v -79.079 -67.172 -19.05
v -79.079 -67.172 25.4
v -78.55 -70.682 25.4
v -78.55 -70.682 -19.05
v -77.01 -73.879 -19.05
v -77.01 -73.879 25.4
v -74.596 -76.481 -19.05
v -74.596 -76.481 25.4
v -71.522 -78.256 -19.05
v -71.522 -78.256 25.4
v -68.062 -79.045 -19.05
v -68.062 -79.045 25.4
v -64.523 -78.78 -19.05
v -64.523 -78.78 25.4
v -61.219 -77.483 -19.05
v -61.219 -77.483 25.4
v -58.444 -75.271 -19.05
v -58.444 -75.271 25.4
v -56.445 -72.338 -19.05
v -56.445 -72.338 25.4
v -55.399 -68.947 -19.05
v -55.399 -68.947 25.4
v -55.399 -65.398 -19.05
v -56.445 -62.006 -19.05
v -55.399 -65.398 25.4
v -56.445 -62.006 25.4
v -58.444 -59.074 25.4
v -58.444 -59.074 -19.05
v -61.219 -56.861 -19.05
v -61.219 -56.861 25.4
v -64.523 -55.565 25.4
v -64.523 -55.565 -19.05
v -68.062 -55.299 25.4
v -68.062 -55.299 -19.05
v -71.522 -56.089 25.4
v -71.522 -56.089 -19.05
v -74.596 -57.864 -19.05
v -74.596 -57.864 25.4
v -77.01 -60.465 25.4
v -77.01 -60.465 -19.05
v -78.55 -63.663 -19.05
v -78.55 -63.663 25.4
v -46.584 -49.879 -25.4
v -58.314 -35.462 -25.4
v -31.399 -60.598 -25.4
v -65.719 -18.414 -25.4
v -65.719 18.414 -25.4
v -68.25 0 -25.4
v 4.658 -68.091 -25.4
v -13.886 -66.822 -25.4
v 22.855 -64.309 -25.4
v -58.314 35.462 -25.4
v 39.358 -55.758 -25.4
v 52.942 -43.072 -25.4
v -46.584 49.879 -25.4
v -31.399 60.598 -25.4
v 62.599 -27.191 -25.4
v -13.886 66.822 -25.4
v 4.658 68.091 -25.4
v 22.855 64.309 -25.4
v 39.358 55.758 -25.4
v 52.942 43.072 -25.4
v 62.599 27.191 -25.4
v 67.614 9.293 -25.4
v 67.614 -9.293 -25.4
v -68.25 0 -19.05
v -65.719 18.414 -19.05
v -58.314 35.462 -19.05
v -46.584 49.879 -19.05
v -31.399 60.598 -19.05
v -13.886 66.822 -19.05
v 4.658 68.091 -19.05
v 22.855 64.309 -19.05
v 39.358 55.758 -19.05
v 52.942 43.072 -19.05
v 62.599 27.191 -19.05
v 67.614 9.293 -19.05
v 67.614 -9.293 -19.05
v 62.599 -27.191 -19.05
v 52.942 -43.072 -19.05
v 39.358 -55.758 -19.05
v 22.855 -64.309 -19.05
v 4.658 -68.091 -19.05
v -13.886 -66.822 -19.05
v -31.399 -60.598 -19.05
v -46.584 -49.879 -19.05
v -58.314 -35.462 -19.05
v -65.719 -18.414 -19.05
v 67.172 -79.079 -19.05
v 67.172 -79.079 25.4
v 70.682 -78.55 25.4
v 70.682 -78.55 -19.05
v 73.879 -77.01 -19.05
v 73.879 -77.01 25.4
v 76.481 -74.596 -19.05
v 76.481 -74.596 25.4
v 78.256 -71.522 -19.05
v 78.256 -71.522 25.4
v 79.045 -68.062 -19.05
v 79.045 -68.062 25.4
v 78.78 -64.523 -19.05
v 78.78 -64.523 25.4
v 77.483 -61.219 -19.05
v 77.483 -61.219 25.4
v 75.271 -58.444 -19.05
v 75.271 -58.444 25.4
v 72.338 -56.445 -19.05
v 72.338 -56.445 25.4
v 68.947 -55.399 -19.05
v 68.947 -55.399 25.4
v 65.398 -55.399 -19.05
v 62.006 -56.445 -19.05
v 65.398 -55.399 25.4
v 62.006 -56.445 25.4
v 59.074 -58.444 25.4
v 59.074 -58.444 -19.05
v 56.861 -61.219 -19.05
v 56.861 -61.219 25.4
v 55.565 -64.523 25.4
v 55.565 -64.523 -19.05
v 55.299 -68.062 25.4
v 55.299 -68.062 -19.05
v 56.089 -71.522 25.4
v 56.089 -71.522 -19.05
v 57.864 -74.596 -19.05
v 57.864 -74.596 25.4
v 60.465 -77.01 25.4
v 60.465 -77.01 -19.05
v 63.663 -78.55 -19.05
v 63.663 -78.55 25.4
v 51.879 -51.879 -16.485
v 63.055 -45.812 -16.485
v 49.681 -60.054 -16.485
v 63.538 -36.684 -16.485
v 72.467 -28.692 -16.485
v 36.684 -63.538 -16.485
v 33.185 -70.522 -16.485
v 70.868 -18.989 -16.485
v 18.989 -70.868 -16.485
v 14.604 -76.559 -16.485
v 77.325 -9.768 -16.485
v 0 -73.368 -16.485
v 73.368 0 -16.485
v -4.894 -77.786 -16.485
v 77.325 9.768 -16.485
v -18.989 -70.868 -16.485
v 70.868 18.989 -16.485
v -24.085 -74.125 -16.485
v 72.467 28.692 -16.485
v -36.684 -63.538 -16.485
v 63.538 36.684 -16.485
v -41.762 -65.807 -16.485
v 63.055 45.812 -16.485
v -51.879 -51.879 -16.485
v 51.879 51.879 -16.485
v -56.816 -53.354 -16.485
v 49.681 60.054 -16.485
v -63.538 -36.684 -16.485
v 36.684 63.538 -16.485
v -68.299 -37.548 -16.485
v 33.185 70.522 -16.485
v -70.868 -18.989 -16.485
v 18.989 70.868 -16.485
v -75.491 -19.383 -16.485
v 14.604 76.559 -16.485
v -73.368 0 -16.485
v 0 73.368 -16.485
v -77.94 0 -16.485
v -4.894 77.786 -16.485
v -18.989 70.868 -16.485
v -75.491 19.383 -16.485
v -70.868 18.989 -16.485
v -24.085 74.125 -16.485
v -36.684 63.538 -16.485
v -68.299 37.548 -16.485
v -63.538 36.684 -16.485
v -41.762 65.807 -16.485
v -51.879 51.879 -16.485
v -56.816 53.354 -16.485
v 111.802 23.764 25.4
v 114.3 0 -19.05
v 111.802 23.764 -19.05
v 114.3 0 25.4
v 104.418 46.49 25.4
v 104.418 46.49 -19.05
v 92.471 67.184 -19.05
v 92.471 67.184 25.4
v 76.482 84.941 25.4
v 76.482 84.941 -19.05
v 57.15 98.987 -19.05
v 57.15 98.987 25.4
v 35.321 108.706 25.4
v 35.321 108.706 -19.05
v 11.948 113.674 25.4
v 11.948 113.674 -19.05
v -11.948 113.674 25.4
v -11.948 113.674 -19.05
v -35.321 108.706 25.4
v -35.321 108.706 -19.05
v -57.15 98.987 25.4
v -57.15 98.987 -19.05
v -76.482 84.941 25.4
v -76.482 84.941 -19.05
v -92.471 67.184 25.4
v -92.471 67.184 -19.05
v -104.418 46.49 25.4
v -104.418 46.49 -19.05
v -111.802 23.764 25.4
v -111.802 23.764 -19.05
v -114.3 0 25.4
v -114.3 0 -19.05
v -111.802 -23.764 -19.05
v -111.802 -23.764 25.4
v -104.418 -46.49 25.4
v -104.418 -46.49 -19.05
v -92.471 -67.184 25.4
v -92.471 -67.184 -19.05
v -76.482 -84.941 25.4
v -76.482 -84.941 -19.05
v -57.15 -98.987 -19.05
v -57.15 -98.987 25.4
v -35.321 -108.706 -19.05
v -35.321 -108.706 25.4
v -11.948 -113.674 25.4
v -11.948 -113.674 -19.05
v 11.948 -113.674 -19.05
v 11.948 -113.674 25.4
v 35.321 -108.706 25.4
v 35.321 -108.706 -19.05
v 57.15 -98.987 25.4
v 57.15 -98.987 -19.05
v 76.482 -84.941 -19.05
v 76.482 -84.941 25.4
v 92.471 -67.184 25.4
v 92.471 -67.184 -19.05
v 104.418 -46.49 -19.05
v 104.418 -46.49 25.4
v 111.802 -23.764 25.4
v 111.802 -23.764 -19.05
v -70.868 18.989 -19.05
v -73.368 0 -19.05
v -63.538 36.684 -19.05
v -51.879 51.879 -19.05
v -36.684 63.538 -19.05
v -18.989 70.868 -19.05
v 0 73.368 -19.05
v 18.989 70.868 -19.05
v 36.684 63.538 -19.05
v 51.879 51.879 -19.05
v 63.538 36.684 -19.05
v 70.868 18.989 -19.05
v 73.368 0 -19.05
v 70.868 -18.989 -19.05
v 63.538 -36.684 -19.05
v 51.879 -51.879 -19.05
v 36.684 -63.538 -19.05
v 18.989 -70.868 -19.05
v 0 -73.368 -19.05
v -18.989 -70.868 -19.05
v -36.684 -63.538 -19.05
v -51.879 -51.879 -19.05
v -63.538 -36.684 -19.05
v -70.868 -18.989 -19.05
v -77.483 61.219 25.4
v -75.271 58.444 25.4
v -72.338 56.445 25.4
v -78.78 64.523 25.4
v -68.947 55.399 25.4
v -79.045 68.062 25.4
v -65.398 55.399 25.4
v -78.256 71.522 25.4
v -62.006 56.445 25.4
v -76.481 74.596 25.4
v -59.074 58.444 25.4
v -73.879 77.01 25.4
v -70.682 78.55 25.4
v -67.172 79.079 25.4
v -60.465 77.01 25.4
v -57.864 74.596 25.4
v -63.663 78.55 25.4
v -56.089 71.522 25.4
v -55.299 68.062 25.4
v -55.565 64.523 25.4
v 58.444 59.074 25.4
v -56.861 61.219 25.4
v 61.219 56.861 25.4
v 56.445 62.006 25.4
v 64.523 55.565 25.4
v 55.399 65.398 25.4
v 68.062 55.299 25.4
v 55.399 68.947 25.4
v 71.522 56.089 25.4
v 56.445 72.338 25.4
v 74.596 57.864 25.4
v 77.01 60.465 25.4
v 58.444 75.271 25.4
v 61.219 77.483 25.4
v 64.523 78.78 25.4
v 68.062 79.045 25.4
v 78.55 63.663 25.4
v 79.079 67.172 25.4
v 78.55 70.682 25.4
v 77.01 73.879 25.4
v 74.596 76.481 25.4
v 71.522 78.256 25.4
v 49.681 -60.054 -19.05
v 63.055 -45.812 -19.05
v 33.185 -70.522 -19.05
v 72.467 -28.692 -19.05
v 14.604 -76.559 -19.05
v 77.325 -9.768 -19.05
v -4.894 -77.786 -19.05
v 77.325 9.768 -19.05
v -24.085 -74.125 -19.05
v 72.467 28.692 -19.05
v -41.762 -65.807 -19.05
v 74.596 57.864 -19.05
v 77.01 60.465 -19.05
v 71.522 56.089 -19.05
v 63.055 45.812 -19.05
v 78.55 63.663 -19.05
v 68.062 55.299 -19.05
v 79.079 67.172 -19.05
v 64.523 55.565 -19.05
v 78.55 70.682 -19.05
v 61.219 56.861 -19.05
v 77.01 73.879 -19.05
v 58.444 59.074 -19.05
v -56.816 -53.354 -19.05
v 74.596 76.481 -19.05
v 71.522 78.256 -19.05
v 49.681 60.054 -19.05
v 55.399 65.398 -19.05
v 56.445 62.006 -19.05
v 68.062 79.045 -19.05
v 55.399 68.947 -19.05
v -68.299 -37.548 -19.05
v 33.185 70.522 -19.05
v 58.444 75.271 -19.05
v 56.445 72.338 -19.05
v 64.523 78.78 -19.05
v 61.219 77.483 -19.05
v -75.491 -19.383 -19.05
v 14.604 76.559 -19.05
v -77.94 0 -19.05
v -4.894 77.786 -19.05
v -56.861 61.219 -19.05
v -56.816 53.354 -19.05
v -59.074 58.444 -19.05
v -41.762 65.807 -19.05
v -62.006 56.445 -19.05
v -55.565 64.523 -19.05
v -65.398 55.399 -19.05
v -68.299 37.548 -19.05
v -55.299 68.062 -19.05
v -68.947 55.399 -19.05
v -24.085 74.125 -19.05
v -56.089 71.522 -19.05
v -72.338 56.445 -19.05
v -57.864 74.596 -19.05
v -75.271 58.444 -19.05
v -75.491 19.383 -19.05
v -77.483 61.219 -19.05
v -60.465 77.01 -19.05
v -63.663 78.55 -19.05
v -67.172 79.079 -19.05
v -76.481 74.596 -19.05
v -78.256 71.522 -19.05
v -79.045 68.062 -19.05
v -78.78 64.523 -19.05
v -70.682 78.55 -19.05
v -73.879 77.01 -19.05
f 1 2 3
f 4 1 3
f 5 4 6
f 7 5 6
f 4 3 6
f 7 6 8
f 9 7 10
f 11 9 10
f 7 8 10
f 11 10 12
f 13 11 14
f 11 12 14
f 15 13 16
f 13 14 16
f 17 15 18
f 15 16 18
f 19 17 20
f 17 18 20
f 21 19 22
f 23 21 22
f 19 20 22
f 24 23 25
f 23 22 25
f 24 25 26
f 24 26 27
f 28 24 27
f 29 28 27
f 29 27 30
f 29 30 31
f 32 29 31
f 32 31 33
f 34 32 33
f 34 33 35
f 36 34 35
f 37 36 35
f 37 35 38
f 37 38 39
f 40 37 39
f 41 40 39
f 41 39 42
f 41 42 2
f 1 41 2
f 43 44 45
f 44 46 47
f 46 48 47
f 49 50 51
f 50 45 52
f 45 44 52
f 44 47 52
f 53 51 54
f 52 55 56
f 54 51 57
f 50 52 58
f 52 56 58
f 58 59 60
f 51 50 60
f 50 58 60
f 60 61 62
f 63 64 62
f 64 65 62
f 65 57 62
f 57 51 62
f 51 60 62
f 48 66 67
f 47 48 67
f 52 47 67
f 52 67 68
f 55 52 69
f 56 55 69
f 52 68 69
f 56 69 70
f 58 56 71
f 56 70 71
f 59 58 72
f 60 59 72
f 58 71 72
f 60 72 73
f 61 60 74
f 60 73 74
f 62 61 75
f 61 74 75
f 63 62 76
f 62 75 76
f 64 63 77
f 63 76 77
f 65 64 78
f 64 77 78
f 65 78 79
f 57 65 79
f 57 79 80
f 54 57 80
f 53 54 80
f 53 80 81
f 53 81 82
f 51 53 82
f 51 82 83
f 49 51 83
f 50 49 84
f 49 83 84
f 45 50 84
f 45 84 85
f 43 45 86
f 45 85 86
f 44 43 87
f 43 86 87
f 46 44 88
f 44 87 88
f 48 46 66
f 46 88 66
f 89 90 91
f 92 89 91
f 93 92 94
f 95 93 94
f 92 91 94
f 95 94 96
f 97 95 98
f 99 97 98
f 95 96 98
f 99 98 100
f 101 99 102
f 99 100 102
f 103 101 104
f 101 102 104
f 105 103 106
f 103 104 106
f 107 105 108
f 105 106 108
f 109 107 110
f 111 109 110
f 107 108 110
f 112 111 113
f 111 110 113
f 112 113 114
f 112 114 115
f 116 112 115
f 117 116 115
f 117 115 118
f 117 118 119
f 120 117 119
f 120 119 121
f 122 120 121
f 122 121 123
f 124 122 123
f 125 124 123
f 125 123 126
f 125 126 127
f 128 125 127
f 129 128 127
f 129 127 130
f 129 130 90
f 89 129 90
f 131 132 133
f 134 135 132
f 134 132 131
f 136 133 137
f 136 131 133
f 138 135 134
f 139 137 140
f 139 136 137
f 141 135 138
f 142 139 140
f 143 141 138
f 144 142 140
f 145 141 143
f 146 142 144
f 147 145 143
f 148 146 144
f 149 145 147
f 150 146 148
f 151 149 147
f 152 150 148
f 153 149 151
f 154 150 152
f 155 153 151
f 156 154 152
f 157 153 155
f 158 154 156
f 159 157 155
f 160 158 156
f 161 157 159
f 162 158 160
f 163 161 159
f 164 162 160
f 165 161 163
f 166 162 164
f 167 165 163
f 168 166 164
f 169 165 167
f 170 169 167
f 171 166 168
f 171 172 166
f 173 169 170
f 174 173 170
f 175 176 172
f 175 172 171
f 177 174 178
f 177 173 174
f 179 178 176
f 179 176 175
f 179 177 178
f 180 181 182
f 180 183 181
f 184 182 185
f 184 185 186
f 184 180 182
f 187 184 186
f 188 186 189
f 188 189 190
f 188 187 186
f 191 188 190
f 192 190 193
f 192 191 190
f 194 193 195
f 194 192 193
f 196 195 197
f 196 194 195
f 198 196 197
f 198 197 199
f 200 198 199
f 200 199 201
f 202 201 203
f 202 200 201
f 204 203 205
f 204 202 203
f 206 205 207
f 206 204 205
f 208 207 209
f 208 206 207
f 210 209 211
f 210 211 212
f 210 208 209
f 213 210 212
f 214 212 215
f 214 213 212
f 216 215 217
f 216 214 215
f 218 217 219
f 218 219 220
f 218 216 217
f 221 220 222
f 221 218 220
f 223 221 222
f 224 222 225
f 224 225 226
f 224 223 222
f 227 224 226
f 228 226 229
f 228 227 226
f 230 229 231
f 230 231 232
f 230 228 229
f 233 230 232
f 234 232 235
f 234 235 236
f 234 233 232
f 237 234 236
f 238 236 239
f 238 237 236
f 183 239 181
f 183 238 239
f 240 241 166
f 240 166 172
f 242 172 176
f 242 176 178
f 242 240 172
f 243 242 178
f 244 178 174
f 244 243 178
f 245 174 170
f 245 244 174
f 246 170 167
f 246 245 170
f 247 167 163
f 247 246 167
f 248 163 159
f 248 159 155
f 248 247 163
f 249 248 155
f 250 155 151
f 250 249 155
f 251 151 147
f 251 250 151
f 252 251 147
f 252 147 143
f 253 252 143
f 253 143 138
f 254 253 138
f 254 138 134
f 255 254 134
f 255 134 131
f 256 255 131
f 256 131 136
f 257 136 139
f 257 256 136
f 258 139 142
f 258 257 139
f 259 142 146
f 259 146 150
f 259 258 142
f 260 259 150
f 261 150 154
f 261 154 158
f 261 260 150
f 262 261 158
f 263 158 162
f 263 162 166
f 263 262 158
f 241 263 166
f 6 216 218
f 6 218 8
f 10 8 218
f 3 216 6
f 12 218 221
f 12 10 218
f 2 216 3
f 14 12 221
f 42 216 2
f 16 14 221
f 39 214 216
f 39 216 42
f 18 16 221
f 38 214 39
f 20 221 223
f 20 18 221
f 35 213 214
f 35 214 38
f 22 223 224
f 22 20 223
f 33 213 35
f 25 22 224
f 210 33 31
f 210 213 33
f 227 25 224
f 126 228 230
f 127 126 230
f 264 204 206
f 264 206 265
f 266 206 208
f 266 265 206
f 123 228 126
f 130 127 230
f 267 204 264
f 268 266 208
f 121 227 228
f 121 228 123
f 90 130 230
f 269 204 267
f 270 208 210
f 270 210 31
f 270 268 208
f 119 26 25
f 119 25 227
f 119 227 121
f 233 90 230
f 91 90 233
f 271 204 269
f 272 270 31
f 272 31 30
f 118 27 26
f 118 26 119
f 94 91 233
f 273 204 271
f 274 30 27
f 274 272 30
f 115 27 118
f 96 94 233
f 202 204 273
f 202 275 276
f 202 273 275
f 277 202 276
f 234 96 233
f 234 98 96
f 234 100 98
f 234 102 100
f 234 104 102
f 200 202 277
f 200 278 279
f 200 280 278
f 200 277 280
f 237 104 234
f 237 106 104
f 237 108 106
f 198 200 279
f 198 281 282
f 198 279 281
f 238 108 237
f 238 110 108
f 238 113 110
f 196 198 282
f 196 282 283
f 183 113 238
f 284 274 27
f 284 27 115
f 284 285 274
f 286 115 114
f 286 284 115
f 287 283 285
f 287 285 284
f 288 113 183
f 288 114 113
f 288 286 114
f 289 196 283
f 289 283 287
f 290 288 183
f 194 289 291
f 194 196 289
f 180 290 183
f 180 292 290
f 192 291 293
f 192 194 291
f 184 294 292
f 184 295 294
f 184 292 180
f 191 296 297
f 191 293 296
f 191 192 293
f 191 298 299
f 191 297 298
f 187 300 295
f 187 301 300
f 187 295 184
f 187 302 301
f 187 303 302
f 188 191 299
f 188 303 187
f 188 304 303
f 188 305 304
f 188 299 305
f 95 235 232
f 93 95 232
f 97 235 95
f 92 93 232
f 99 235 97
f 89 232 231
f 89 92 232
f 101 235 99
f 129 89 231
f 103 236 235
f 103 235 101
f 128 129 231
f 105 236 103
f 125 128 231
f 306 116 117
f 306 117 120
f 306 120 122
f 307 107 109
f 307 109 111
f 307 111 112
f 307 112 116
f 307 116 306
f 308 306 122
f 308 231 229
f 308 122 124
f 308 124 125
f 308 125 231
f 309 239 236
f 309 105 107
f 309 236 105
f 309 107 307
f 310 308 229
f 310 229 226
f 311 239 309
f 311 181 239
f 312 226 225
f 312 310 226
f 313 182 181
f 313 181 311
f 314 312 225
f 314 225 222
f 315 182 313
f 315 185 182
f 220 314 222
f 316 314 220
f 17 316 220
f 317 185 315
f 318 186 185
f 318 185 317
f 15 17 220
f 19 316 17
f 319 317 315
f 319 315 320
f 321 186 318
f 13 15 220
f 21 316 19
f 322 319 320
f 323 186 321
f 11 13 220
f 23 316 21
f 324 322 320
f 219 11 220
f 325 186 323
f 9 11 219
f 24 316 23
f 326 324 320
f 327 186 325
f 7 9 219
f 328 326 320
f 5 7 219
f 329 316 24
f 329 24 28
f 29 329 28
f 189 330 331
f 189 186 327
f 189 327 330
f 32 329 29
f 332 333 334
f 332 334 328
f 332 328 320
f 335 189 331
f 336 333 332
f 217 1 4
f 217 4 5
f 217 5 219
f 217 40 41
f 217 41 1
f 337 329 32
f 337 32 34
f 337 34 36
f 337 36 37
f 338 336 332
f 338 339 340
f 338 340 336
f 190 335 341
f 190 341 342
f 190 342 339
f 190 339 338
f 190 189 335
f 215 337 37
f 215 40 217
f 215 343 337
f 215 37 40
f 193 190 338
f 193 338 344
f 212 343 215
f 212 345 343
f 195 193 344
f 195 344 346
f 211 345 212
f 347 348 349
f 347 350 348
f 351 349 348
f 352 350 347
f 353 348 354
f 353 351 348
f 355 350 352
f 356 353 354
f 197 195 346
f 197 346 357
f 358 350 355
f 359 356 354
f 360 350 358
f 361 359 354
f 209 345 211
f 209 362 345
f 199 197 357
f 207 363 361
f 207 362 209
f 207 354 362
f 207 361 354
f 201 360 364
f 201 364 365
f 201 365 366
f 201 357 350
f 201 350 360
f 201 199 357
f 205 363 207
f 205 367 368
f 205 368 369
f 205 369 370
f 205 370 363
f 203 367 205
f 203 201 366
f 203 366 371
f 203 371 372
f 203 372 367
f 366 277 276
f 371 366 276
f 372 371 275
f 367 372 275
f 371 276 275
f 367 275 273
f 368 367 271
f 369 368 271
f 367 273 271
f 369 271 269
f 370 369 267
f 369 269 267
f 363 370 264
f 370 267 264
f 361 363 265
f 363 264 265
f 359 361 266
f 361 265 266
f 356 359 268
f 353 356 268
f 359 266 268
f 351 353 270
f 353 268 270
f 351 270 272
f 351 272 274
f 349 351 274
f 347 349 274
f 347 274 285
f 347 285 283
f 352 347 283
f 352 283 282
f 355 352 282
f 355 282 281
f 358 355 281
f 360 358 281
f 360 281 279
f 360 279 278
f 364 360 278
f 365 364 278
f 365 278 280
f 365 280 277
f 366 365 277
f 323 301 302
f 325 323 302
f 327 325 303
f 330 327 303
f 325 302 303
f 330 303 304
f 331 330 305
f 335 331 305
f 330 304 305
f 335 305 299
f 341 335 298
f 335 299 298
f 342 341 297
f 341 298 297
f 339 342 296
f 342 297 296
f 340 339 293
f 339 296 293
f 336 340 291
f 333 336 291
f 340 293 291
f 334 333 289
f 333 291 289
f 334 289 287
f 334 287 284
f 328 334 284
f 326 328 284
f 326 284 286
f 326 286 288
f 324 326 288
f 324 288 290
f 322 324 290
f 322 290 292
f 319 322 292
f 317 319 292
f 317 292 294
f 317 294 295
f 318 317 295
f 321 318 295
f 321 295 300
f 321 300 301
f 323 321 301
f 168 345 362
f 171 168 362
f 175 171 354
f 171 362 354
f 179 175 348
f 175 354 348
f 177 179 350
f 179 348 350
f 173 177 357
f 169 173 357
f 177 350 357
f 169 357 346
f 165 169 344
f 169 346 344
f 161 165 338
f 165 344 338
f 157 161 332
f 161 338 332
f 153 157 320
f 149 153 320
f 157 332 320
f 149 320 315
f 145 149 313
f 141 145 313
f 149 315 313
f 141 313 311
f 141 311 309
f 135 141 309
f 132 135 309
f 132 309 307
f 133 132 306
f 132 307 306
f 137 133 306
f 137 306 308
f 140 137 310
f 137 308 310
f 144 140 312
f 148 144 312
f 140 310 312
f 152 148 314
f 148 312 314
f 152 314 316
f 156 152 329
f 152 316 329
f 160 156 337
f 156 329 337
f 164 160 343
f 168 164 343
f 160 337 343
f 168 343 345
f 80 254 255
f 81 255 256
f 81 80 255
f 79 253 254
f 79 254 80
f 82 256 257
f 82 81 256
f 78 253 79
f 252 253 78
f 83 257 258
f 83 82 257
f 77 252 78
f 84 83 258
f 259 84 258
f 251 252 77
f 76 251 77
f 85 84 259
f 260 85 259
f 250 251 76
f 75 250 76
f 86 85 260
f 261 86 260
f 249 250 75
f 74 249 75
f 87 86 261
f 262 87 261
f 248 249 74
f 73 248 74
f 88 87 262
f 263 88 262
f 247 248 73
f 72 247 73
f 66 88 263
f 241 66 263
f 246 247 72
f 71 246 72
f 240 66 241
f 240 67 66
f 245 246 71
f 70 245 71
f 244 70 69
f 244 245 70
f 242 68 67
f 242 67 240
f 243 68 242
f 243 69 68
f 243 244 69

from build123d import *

# Parameters (mm, degrees)
SKETCH1_R           = 114.3
BOSS_EXTRUDE1_DEPTH = 25.4
CUT_EXTRUDE1_START  = -6.35
SKETCH2_R           = 114.3
SKETCH2_R_2         = 68.2498
CUT_EXTRUDE1_DEPTH  = 6.35
SKETCH3_R           = 77.9399
SKETCH3_R_2         = 73.3679
CUT_EXTRUDE2_DEPTH  = 2.5654
CUT_EXTRUDE3_REACH  = 171.439
SKETCH5_R           = 11.90625
CIRPATTERN1_COUNT   = 4


with BuildPart() as part:
    # Sketch1 → Boss-Extrude1 (new, symmetric)
    with BuildSketch(Plane.XY):
        Circle(SKETCH1_R)
    extrude(amount=BOSS_EXTRUDE1_DEPTH, both=True)

    # Sketch2 → Cut-Extrude1 (cut)
    with BuildSketch(Plane(origin=(0, 0, -25.4), x_dir=(-1, 0, 0), z_dir=(0, 0, -1)).offset(CUT_EXTRUDE1_START)):
        Circle(SKETCH2_R)
        Circle(SKETCH2_R_2, mode=Mode.SUBTRACT)
    extrude(amount=CUT_EXTRUDE1_DEPTH, mode=Mode.SUBTRACT)

    # Sketch3 → Cut-Extrude2 (cut)
    with BuildSketch(Plane(origin=(0, 0, -19.05), x_dir=(-1, 0, 0), z_dir=(0, 0, -1))):
        Circle(SKETCH3_R)
        Circle(SKETCH3_R_2, mode=Mode.SUBTRACT)
    extrude(amount=-CUT_EXTRUDE2_DEPTH, mode=Mode.SUBTRACT)

    # Sketch5 → Cut-Extrude3 (cut, up to next)
    with BuildSketch(Plane.XY.offset(25.4), mode=Mode.PRIVATE) as cut_extrude3_sk1:
        with Locations((67.172315786, 67.172315786)):
            Circle(SKETCH5_R)
    cut_extrude3_tool1 = extrude(cut_extrude3_sk1.sketch, amount=-CUT_EXTRUDE3_REACH, mode=Mode.PRIVATE) & part.part
    cut_extrude3 = cut_extrude3_tool1.solids().sort_by_distance((67.172316, 67.172316, 25.4))[0]
    add(cut_extrude3, mode=Mode.SUBTRACT)

    # CirPattern1: Cut-Extrude3 ×4 about axis
    cirpattern1_axis = Axis((0, 0, 0), (0, 0, 1))
    for i in range(1, CIRPATTERN1_COUNT):
        add(cut_extrude3.rotate(cirpattern1_axis, i * 360 / CIRPATTERN1_COUNT), mode=Mode.SUBTRACT)


solid = part.part
